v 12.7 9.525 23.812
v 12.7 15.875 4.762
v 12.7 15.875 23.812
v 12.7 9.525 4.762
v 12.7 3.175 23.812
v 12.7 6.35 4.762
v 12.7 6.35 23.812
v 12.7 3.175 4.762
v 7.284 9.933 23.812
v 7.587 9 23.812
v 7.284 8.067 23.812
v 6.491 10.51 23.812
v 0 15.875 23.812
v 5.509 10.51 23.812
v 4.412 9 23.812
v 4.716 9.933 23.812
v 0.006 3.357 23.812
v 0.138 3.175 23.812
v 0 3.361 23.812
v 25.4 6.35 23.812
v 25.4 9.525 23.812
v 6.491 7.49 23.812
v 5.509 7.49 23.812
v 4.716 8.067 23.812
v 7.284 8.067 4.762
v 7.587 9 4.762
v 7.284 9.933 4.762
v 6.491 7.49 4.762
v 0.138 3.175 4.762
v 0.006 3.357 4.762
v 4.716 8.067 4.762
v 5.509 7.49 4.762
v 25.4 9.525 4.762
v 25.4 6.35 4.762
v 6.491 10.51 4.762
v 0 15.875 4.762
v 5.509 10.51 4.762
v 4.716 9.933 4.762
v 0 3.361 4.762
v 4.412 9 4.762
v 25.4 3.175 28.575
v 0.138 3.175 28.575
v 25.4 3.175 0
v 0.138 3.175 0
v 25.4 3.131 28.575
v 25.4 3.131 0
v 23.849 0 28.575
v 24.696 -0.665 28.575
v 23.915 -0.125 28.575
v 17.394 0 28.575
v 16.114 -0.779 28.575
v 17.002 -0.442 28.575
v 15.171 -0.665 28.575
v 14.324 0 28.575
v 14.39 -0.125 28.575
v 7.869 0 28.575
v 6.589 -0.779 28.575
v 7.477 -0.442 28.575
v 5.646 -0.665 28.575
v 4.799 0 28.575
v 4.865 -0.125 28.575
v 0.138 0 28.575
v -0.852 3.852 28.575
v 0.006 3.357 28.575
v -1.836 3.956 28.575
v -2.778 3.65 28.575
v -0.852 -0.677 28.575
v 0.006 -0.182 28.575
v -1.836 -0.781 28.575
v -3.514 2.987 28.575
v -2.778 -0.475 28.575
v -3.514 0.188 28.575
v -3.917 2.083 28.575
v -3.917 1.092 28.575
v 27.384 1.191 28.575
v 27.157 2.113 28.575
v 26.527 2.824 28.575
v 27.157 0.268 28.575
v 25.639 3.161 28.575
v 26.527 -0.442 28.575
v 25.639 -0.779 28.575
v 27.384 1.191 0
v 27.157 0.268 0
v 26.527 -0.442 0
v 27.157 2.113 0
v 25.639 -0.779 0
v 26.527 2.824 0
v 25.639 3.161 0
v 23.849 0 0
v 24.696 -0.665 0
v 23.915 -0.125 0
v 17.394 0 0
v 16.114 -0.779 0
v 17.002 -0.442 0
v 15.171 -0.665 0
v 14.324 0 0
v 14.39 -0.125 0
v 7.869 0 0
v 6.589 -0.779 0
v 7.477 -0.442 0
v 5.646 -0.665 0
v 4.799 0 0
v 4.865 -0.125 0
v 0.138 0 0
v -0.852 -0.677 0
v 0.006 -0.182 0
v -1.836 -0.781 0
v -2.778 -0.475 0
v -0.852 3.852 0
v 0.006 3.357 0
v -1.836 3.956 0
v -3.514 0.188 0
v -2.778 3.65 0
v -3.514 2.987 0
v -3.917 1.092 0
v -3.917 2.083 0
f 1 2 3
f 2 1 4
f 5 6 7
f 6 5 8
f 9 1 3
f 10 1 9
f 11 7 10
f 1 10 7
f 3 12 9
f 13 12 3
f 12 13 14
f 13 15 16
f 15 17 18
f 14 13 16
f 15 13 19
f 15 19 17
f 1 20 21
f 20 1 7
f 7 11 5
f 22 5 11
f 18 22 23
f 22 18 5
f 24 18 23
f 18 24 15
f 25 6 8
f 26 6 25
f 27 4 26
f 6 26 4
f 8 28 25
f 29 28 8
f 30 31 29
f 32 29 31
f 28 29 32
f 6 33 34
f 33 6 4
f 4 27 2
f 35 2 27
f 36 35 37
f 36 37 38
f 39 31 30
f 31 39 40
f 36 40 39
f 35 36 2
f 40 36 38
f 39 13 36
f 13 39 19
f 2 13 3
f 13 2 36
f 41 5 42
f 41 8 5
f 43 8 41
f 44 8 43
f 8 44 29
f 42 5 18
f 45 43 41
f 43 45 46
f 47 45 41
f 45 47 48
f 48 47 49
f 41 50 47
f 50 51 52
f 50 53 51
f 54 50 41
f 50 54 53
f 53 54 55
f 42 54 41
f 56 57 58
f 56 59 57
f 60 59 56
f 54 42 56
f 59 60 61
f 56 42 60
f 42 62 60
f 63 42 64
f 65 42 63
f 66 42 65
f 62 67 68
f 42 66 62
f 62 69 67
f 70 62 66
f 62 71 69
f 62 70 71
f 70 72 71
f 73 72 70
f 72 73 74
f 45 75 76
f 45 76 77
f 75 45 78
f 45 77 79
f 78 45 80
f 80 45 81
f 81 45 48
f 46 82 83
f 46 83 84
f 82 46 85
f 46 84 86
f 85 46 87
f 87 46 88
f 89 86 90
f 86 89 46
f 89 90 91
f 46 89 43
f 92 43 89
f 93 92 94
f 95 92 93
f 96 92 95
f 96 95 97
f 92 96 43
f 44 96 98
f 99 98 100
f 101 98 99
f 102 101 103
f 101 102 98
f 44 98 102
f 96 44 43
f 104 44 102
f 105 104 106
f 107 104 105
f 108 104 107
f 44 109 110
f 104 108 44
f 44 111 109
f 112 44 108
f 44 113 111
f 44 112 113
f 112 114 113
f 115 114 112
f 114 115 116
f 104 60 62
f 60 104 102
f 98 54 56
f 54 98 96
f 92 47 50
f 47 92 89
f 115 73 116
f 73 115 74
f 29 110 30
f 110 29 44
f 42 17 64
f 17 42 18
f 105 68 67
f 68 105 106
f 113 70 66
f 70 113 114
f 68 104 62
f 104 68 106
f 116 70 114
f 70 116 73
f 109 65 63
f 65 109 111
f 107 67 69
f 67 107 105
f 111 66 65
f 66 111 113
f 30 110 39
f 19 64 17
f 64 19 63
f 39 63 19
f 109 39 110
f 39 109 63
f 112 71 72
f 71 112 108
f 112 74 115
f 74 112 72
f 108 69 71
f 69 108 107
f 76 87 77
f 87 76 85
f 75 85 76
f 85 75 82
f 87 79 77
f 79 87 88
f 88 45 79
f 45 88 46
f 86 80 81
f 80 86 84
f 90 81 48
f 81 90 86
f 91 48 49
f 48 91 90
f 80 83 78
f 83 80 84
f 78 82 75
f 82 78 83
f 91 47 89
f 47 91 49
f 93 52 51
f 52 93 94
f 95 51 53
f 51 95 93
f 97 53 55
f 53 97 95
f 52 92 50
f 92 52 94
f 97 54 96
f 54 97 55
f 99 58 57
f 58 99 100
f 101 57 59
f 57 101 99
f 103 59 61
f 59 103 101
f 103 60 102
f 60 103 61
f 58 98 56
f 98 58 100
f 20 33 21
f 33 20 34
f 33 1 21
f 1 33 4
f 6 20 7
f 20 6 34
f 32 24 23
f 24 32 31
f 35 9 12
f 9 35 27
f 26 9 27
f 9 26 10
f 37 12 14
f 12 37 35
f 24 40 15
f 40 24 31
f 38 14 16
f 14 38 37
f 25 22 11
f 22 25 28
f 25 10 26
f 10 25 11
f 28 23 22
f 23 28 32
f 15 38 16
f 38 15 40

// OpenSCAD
// file: joints.scad
/**
 * joints.scad is part of Paper Laptop project.
 * This file contains various models for joining two or
 * more pieces of flat materials together.
 *
 * @author R. S. Doiel, <rsdoiel@gmail.com>
 * copyright (c) 2016 all rights reserved
 * Released under a BSD 2-clause license
 */

// Formboard firm enough to make a case with is about
// 1/4th inch (6.35mm) thick. Usually sold in single sheets
// of about 20"x30".

//
// Basic models are for parts without any holes for fasteners.
//

/*
 * CornerBasic() - corner joint without fastener hole
 */
module CornerBasic() {
    u = 3.175; // Unit is 3.175mm or 1/8th inch:w
    t = 6.35; // Thickness of the 1/4th" Foamboard

    // Inner block, width, depth, height
    translate([0, t, t/2]) {
        difference() {
            color([1,0,0]) cube([25.4, 25.4, 25.4]);
            translate([t*3.5,t*3.5,-1]) {
                color([1,0,1]) cylinder(h=28,r=t*1.25,center=false);
            }
        }
    }
 
     // Inner shell
    translate([t,2*t,t/2]) {
        color([0,1,0]) cube([50.8-t,t/2,25.4]);
        color([0,1,0]) cube([t/2,50.8-t,25.4]);
    }
   
    // Outer shell
    color([0,1,0]) cube([50.8,t,25.4+t]);
    translate([-t,t,0]) {
        color([0,1,0]) cube([t,50.8,25.4+t]);
    }
    // Outer corners
    translate([u*-1,u,0]) {
        color([0,1,0]) cylinder(h=25.4+t,r=1.5*u,center=false);
    }

    // Outer bumps
    translate([u*-1.25,u*18,0]) {
        color([0,1,0]) cylinder(h=25.4+t,r=1.25*u,center=false);
    }
    translate([u*-1.25,u*12,0]) {
        color([0,1,0]) cylinder(h=25.4+t,r=1.25*u,center=false);
    }
    translate([u*-1.25,u*6,0]) {
        color([0,1,0]) cylinder(h=25.4+t,r=1.25*u,center=false);
    }

    translate([u*16,u*0.75,0]) {
        color([0,1,0]) cylinder(h=25.4+t,r=1.25*u,center=false);
    }
    translate([u*10,u*0.75,0]) {
        color([0,1,0]) cylinder(h=25.4+t,r=1.25*u,center=false);
    }
    translate([u*4,u*0.75,0]) {
        color([0,1,0]) cylinder(h=25.4+t,r=1.25*u,center=false);
    }    
}

//
// Corner() basic corner joint plus hole for fastener
//
module Corner() {
    // Scale down the basic corner so that the
    // for 50% width/depth, 75% of height 
    scale([0.5, 0.5, 0.75]) {
        difference() {
            u = 3.175;
            CornerBasic();
            // Add a hole for screw
            translate([12,18,0]) {
                color([0,0,1]) cylinder(
                    h=25.4+(4*u),
                    r=u,
                    center=false
                );
            }
        }
    }
}

//
// EndBasic
//
module EndBasic() {
    u = 3.175; // Unit is 3.175mm or 1/8th inch:w
    t = 6.35; // Thickness of the 1/4th" Foamboard

    // Inner block, width, depth, height
    translate([0, t, t]) {
            color([1,0,0]) cube([25.4, 25.4, 25.4]); 
    }
    // Outer shell
    color([0,1,0]) cube([50.8,t,25.4+(2*t)]);

    // Outer corners
    translate([u*-1,u,0]) {
        color([0,1,0]) cylinder(h=25.4+(2*t),r=1.5*u,center=false);
    }

    translate([u*16,u*0.75,0]) {
        color([0,1,0]) cylinder(h=25.4+(2*t),r=1.25*u,center=false);
    }
    translate([u*10,u*0.75,0]) {
        color([0,1,0]) cylinder(h=25.4+(2*t),r=1.25*u,center=false);
    }
    translate([u*4,u*0.75,0]) {
        color([0,1,0]) cylinder(h=25.4+(2*t),r=1.25*u,center=false);
    }
    
    // Inner shell
    translate([t,2*t,t]) {
        color([0,1,0]) cube([50.8-t,t,25.4]);
    }
}

//
// End() basic corner joint plus hole for fastener
//
module End() {
    // Scale down the basic corner so that the
    // for 50% width/depth, 75% of height 
    scale([0.5, 0.5, 0.75]) {
        difference() {
            u = 3.175;
            EndBasic();
            // Add a hole for screw
            translate([12,18,0]) {
                color([0,0,1]) cylinder(h=25.4+(4*u),r=u,center=false);
            }
        }
    }
}

//
// SpliceBasic
//
module SpliceBasic() {
    u = 3.175; // Unit is 3.175mm or 1/8th inch:w
    t = 6.35; // Thickness of the 1/4th" Foamboard

    // Inner block (cube: [width, depth, height])
    translate([0, t, t]) {
            color([1,0,0]) cube([25.4, 25.4, 25.4]); 
    }
    // Outer shell
    color([0,1,0]) cube([50.8,t,25.4+(2*t)]);
    
    // Outer corners
    translate([u*16,u*0.75,0]) {
        color([0,1,0]) cylinder(h=25.4+(2*t),r=1.25*u,center=false);
    }
    translate([u*10,u*0.75,0]) {
        color([0,1,0]) cylinder(h=25.4+(2*t),r=1.25*u,center=false);
    }
    translate([u*4,u*0.75,0]) {
        color([0,1,0]) cylinder(h=25.4+(2*t),r=1.25*u,center=false);
    }
    
    // Inner shell
    translate([t,2*t,t]) {
        color([0,1,0]) cube([50.8-t,t,25.4]);
    }
    
    // Mirrored shapes
    mirror(180) {
        // Inner block (cube: [width, depth, height])
        translate([0, t, t]) {
                color([1,0,0]) cube([25.4, 25.4, 25.4]); 
        }
        // Outer shell
        color([0,1,0]) cube([50.8,t,25.4+(2*t)]);
        
        // Outer corners
        translate([u*16,u*0.75,0]) {
            color([0,1,0]) cylinder(h=25.4+(2*t),r=1.25*u,center=false);
        }
        translate([u*10,u*0.75,0]) {
            color([0,1,0]) cylinder(h=25.4+(2*t),r=1.25*u,center=false);
        }
        translate([u*4,u*0.75,0]) {
            color([0,1,0]) cylinder(h=25.4+(2*t),r=1.25*u,center=false);
        }
        
        // Inner shell
        translate([t,2*t,t]) {
            color([0,1,0]) cube([50.8-t,t,25.4]);
        }
    }
}

//
// Splice() basic corner joint plus hole for fastener
//
module Splice() {
    scale([0.5, 0.5, 0.75]) {
        difference() {
            u = 3.175;
            SpliceBasic();
            // Add a hole for screw
            translate([0,18,0]) {
                color([0,0,1]) cylinder(h=25.4+(4*u),r=u,center=false);
            }
        }
    }
}


// Four corner joints
module FourCornersGrouped() {
    Corner();
    translate([120,6.35,0]) {
        rotate(90) {
            Corner();
        }
    }
    translate([114, 124, 0]) {
        rotate(180) {
            Corner();
            translate([120,6.35,0]) {
                rotate(90) {
                    Corner();
                }
            }
        }
    }
}

// Two End Pieces
module TwoEndsGrouped() {
    translate([0, 0, 0]) {
        End();
    }
    translate([114, 0, 0]) {
        mirror(180) End();
    }
}

module TwoSplicesGrouped() {
    translate([58, 0, 0]) {
        Splice();
    }
    translate([58, 38, 0]) {
        Splice();
    }
}

//Corner();
//Splice();
//End();
//FourCornersGrouped();
//TwoEndsGrouped();
//TwoSplicesGrouped();
// main file
/**
 * Print a single end.
 */
 include <joints.scad>
 
 
End();
